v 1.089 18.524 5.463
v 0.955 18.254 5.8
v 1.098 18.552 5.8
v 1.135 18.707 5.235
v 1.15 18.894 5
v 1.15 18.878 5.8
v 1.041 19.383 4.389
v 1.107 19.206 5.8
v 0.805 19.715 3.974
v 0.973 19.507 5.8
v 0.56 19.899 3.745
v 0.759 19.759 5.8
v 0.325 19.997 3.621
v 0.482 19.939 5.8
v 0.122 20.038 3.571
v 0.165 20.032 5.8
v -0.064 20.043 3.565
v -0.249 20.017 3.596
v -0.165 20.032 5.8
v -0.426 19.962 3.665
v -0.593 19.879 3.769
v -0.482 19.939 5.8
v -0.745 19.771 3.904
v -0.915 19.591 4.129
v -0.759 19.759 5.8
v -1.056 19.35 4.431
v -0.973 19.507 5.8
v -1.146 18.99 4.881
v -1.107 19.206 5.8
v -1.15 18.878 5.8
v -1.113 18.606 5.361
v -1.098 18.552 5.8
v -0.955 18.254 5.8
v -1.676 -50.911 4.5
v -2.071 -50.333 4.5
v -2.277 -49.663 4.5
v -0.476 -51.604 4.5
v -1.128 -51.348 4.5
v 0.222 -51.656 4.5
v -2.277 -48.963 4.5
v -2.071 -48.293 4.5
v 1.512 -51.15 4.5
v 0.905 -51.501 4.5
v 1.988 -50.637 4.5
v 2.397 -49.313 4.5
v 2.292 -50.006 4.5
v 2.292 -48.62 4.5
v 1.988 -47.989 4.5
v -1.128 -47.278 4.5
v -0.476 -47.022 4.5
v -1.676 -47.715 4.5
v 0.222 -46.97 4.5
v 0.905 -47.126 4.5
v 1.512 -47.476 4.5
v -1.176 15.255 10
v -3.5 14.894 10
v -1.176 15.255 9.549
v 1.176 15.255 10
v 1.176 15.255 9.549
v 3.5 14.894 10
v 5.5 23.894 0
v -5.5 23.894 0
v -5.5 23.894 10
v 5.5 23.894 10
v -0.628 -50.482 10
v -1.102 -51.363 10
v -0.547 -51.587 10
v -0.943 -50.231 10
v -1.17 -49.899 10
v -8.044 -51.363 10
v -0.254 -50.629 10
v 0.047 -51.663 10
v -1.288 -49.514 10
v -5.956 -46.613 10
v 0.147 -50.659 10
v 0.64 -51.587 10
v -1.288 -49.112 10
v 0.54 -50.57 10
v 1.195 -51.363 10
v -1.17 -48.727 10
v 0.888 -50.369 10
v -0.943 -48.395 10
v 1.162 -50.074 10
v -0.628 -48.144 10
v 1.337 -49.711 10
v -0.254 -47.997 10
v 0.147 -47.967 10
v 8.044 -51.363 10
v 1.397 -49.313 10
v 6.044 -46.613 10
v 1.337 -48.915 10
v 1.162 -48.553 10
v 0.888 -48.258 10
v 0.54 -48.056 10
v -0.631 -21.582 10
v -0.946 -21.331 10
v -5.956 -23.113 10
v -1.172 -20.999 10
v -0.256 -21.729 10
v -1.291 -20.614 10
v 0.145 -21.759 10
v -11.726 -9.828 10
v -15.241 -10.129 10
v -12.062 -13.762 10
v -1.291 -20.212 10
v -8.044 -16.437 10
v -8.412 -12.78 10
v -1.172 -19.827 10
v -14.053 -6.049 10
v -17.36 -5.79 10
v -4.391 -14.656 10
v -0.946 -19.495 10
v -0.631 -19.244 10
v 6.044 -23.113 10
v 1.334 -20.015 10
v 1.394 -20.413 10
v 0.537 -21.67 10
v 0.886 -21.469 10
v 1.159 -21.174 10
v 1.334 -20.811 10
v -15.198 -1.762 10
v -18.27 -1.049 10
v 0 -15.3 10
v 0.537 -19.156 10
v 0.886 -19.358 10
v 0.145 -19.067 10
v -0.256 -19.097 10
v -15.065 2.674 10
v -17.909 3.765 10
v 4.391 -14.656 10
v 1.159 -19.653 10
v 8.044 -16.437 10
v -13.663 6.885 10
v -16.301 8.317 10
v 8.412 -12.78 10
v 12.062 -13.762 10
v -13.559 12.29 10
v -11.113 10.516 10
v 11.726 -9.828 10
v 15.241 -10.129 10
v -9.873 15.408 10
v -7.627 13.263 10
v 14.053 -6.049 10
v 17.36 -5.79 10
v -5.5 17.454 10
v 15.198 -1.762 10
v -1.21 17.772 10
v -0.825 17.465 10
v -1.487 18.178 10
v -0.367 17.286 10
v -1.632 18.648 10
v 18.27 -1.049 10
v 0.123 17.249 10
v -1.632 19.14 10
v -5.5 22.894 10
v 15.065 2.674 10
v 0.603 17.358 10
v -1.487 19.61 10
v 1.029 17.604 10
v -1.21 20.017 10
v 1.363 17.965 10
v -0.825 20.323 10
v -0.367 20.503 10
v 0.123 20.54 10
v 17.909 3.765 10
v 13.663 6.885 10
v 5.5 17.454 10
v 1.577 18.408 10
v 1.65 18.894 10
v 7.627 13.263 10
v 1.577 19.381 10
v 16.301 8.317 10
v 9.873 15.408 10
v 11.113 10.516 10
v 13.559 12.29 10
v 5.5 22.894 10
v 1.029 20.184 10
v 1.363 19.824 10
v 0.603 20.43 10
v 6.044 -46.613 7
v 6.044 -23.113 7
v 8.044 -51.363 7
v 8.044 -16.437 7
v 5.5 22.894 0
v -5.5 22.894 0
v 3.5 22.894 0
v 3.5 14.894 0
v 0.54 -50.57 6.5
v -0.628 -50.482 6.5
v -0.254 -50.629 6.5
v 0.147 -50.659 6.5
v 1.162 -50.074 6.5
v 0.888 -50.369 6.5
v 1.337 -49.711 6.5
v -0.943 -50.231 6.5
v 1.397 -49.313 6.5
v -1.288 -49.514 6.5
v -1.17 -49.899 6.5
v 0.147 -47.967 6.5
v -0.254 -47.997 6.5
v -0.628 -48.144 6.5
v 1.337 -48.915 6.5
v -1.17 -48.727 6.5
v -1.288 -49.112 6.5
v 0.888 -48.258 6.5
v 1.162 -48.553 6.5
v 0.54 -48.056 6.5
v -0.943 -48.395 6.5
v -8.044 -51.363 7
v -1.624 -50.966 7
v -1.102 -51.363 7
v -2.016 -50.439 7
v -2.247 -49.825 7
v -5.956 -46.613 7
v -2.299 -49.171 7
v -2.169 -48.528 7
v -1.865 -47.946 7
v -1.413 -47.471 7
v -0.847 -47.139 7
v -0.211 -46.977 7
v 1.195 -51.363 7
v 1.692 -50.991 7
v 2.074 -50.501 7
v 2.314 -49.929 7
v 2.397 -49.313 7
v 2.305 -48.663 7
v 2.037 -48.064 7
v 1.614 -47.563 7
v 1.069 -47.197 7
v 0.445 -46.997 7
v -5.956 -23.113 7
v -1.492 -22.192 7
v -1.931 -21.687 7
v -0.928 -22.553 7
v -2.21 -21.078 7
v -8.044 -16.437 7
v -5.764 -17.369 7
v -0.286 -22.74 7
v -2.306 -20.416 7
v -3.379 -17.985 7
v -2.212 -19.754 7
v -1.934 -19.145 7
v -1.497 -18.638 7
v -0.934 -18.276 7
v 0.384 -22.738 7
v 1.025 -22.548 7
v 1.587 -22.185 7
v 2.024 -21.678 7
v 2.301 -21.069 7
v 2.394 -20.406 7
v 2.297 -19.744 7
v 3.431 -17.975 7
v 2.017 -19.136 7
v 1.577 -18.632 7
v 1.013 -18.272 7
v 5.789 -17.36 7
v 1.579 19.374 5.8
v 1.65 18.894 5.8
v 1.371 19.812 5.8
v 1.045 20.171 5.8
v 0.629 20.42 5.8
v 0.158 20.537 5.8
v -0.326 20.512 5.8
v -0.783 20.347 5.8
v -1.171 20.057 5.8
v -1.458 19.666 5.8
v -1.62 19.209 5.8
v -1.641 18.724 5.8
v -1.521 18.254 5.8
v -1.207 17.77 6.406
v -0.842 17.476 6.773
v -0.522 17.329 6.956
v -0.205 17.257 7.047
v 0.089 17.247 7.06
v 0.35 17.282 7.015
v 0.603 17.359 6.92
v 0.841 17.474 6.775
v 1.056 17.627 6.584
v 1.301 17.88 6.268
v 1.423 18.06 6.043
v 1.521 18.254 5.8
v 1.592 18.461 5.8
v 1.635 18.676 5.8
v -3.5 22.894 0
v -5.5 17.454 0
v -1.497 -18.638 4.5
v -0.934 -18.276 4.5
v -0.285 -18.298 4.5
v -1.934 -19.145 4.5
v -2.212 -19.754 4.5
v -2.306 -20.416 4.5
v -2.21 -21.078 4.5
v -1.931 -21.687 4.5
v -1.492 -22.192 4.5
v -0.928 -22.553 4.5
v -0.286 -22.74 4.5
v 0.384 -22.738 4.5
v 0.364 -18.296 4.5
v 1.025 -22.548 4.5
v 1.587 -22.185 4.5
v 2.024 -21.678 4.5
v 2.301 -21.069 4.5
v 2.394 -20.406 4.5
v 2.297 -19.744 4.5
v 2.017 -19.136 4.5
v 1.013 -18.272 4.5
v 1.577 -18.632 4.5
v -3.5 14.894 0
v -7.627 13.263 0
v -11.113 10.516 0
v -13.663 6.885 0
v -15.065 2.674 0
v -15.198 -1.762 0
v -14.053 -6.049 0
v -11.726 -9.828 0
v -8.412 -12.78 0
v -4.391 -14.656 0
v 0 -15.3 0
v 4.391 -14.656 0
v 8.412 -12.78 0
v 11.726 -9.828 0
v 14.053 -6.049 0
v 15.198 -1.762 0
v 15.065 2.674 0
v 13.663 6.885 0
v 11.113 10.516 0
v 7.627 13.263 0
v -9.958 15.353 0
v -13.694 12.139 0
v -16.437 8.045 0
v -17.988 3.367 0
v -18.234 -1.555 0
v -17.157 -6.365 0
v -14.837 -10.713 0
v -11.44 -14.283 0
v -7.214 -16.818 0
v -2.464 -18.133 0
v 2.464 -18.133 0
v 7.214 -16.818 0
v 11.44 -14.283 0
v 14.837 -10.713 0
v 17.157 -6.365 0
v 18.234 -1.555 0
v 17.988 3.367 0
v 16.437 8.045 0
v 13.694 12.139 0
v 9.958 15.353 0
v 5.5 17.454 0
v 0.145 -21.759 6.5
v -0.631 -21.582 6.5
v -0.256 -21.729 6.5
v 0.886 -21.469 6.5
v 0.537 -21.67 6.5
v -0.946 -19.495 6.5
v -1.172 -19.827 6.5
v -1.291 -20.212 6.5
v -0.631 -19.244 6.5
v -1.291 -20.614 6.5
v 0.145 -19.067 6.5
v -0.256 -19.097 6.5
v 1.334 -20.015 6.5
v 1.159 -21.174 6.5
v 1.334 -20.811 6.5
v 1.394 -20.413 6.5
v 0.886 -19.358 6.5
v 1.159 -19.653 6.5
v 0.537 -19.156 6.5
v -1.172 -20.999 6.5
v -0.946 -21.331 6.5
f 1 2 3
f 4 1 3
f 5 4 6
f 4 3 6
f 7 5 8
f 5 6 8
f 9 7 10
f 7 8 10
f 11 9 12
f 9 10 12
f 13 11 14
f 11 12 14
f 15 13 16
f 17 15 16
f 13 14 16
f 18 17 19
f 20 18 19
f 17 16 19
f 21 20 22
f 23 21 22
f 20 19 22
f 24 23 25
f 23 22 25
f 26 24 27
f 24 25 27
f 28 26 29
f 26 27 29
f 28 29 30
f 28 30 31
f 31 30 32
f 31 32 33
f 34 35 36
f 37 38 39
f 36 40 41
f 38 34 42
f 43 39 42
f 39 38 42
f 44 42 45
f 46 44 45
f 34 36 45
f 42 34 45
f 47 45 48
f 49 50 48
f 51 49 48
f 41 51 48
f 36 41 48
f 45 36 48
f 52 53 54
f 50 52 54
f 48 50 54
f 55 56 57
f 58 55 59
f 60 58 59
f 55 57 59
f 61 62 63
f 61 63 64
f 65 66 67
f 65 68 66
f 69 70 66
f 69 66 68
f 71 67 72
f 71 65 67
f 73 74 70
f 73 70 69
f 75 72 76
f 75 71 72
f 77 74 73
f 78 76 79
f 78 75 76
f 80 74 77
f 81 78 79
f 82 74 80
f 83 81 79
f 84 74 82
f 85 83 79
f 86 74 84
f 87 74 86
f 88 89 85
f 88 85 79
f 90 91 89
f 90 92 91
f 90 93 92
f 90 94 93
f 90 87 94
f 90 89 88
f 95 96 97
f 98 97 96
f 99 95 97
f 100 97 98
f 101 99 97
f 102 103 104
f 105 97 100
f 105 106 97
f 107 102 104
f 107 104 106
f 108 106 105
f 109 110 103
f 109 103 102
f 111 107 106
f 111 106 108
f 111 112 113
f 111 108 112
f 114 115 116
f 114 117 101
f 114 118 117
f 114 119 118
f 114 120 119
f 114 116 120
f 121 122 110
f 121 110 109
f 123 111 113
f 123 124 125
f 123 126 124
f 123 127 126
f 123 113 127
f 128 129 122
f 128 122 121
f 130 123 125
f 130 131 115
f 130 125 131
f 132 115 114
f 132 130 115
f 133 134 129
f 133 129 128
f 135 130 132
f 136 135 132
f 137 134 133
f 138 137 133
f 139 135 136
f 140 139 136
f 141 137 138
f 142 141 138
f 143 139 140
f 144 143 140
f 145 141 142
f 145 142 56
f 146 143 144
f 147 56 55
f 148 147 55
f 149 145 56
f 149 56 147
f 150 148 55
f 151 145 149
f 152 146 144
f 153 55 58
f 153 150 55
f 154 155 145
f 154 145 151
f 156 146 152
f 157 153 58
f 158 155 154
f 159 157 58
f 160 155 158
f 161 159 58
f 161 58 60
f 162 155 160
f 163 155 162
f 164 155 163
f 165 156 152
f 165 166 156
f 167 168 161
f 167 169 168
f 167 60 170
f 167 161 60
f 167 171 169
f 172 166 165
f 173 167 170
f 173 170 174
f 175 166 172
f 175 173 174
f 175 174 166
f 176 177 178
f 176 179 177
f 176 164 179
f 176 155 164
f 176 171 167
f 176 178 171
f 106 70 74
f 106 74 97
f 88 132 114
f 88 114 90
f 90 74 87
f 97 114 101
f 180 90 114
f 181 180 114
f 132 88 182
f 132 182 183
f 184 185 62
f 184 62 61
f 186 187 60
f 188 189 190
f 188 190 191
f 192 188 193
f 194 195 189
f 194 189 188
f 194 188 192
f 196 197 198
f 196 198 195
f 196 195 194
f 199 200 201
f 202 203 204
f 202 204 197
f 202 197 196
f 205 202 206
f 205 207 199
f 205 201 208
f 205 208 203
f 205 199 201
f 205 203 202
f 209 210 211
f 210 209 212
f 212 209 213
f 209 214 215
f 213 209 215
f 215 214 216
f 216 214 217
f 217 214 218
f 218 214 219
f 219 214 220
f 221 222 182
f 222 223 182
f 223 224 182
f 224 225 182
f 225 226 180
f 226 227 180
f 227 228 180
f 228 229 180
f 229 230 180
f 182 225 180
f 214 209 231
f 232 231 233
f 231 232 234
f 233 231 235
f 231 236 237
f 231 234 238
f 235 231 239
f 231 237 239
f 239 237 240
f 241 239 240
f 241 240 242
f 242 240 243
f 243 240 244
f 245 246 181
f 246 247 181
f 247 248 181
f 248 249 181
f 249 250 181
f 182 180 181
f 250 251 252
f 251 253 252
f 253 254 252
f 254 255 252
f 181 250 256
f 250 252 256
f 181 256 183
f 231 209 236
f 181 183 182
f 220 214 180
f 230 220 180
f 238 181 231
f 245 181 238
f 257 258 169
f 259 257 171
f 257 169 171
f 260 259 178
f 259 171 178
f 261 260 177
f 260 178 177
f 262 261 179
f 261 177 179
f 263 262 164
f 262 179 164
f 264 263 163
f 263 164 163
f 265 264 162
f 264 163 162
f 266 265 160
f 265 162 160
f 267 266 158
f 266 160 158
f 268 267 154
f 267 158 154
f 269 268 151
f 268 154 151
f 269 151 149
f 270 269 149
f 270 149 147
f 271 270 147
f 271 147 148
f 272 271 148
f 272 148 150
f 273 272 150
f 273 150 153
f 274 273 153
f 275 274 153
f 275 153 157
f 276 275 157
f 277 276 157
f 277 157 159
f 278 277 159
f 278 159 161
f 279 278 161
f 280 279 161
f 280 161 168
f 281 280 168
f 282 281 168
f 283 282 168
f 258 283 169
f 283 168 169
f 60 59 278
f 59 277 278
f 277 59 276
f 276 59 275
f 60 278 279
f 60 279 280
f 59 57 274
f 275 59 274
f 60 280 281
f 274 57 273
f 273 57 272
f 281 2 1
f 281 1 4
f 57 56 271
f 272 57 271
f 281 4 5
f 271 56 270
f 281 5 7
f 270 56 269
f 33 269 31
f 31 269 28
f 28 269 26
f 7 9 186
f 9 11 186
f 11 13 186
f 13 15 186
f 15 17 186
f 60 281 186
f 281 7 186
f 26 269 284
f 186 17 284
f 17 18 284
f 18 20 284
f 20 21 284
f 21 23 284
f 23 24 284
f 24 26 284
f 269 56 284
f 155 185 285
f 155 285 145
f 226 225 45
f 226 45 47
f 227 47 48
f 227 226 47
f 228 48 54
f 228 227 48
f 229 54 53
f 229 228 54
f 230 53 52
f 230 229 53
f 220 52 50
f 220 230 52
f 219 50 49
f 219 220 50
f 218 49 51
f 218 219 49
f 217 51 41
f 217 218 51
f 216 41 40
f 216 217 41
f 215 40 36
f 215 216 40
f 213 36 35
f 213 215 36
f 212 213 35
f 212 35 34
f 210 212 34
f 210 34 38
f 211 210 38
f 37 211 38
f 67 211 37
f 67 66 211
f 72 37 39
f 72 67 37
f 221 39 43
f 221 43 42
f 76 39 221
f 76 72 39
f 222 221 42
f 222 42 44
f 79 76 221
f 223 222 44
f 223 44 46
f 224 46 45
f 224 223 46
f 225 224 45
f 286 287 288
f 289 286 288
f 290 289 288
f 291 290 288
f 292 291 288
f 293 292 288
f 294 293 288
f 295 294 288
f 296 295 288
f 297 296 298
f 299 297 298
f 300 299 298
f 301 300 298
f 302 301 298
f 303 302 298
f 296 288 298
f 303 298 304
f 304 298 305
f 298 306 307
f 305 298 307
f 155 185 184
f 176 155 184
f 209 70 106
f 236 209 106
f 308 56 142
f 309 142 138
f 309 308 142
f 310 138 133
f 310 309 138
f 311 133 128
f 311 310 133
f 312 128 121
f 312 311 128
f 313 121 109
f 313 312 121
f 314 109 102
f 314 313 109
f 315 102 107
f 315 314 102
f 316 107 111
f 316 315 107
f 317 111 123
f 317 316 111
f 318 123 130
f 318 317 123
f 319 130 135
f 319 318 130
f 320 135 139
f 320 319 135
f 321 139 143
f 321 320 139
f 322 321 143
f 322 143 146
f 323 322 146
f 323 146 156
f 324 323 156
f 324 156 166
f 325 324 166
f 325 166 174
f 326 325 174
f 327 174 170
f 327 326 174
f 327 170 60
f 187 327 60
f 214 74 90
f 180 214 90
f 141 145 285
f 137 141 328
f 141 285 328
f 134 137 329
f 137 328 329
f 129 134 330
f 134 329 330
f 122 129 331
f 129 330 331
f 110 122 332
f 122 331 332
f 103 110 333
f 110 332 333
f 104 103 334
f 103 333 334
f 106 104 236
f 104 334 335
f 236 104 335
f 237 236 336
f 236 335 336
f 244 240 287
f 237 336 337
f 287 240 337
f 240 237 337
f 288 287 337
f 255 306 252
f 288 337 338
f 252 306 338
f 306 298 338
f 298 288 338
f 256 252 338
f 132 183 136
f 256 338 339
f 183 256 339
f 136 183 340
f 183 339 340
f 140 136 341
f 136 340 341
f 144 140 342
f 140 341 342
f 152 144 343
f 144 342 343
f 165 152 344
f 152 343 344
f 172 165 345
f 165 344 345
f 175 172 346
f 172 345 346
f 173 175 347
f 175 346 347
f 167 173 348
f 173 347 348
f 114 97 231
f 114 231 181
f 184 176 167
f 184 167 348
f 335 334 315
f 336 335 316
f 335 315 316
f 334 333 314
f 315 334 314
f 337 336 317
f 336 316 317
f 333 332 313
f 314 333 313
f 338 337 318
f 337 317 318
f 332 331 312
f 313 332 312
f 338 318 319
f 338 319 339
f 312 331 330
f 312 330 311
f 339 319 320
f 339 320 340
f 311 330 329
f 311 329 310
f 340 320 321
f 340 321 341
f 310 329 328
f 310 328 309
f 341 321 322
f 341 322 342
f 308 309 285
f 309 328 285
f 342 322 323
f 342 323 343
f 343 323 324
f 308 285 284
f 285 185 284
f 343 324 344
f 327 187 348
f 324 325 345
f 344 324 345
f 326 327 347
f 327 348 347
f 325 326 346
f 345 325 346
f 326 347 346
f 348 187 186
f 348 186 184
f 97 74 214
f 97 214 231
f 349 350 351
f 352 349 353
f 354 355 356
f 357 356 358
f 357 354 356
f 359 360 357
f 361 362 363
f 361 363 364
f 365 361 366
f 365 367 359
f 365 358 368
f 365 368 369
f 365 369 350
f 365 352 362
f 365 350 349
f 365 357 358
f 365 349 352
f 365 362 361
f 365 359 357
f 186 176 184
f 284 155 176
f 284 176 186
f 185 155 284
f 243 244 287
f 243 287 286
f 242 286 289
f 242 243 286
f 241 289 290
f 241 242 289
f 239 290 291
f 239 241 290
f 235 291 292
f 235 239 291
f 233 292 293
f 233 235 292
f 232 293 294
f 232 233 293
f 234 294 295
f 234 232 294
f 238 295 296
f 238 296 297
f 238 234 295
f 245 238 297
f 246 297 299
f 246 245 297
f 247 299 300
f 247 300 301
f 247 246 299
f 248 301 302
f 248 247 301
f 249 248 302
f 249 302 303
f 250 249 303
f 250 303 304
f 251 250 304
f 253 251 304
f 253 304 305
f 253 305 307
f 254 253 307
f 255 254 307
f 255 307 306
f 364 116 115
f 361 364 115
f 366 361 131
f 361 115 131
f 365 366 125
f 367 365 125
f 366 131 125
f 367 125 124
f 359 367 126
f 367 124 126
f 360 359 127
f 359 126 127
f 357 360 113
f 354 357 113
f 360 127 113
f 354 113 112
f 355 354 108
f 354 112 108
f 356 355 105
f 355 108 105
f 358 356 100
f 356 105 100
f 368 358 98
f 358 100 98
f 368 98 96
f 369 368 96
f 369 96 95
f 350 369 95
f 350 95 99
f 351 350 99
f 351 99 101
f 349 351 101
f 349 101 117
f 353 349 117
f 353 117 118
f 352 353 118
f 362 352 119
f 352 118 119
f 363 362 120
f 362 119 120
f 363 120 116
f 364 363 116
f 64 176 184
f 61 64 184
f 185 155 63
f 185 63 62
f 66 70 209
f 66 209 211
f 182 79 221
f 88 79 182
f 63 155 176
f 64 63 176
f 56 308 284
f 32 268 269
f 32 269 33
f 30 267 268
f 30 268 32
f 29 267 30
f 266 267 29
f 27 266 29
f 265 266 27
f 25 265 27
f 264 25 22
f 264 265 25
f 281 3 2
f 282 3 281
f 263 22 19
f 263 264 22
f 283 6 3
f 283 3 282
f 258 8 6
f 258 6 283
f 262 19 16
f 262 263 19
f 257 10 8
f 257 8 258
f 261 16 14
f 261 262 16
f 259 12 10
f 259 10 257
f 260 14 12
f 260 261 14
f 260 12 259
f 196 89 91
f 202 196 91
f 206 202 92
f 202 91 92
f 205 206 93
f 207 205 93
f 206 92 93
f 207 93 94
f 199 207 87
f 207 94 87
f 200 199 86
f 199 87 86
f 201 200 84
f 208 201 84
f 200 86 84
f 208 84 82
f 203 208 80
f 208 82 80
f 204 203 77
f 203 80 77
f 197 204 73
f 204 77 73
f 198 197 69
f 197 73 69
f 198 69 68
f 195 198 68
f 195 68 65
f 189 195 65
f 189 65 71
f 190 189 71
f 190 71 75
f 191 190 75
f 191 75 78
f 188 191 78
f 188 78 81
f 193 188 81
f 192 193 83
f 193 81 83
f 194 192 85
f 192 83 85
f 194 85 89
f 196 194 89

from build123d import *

# Parameters (mm, degrees)
SKETCH2_R       = 18.3
SKETCH2_R_2     = 15.3
EXTRUDE1_DEPTH  = 10
SKETCH3_W       = 16.087912088
SKETCH3_H       = 34.925770001
SKETCH3_W_2     = 12
SKETCH3_H_2     = 23.5
EXTRUDE2_DEPTH  = 3
SKETCH4_W       = 7
SKETCH4_H       = 3.40570579
EXTRUDE3_DEPTH  = 11
SKETCH5_W       = 7
SKETCH5_H       = 8
EXTRUDE4_DEPTH  = 10
EXTRUDE5_DEPTH  = 7
SKETCH7_W       = 10
SKETCH7_H       = 8
EXTRUDE6_DEPTH  = 2
SKETCH8_W       = 10
SKETCH8_H       = 8
EXTRUDE7_DEPTH  = 2
SKETCH9_W       = 11
SKETCH9_H       = 10
EXTRUDE9_DEPTH  = 1
SKETCH10_R      = 1.65
EXTRUDE10_DEPTH = 4.2
SKETCH11_R      = 1.15
EXTRUDE12_DEPTH = 6.8
SKETCH12_R      = 15.3
EXTRUDE13_DEPTH = 11
SKETCH29_R      = 2.35
EXTRUDE30_DEPTH = 5.5
SKETCH31_R      = 1.35
EXTRUDE31_DEPTH = 3.5


with BuildPart() as part:
    # Sketch2 → Extrude1 (new body)
    with BuildSketch(Plane.XY):
        Circle(SKETCH2_R)
        Circle(SKETCH2_R_2, mode=Mode.SUBTRACT)
    extrude(amount=EXTRUDE1_DEPTH)

    # Sketch3 → Extrude2 (add)
    with BuildSketch(Plane.XY.offset(10)):
        with Locations((0, -33.900183172)):
            Rectangle(SKETCH3_W, SKETCH3_H)
        with Locations((0.043956044, -34.863068172)):
            Rectangle(SKETCH3_W_2, SKETCH3_H_2, mode=Mode.SUBTRACT)
    extrude(amount=-EXTRUDE2_DEPTH)

    # Sketch4 → Extrude3 (cut, through all)
    with BuildSketch(Plane(origin=(0, 0, 0), x_dir=(-1, 0, 0), z_dir=(0, 0, -1))):
        with Locations((0, 16.597147105)):
            Rectangle(SKETCH4_W, SKETCH4_H)
    extrude(amount=-EXTRUDE3_DEPTH, mode=Mode.SUBTRACT)



with BuildPart() as body_2:
    # Sketch5 → Extrude4 (new body)
    with BuildSketch(Plane(origin=(0, 0, 0), x_dir=(-1, 0, 0), z_dir=(0, 0, -1))):
        with Locations((0, 18.89429421)):
            Rectangle(SKETCH5_W, SKETCH5_H)
    extrude(amount=-EXTRUDE4_DEPTH)

    # Sketch6 → Extrude5 (cut)
    with BuildSketch(Plane.ZY.offset(3.5)):
        Polygon((10, 14.89429421), (0, 22.89429421), (0, 14.89429421), align=None)
    extrude(amount=-EXTRUDE5_DEPTH, mode=Mode.SUBTRACT)


with BuildPart() as part_1:
    add(part.part)

    add(body_2.part)  # Extrude6 merges body 2
    # Sketch7 → Extrude6 (add)
    with BuildSketch(Plane.ZY.offset(3.5)):
        with Locations((5, 18.89429421)):
            Rectangle(SKETCH7_W, SKETCH7_H)
    extrude(amount=EXTRUDE6_DEPTH)

    # Sketch8 → Extrude7 (add)
    with BuildSketch(Plane(origin=(3.5, 0, 0), x_dir=(0, 0, -1), z_dir=(1, 0, 0))):
        with Locations((-5, 18.89429421)):
            Rectangle(SKETCH8_W, SKETCH8_H)
    extrude(amount=EXTRUDE7_DEPTH)

    # Sketch10 → Extrude10 (cut)
    with BuildSketch(Plane.XY.offset(10)):
        with Locations((0, 18.89429421)):
            Circle(SKETCH10_R)
    extrude(amount=-EXTRUDE10_DEPTH, mode=Mode.SUBTRACT)

    # Sketch11 → Extrude12 (cut, through all)
    with BuildSketch(Plane.XY.offset(5.8)):
        with Locations((0, 18.89429421)):
            Circle(SKETCH11_R)
    extrude(amount=-EXTRUDE12_DEPTH, mode=Mode.SUBTRACT)

    # Sketch12 → Extrude13 (cut, through all)
    with BuildSketch(Plane(origin=(0, 0, 0), x_dir=(-1, 0, 0), z_dir=(0, 0, -1))):
        Circle(SKETCH12_R)
    extrude(amount=-EXTRUDE13_DEPTH, mode=Mode.SUBTRACT)

    # Sketch29 → Extrude30 (add)
    with BuildSketch(Plane.XY.offset(10)):
        with Locations((0.043956044, -20.413068172)):
            Circle(SKETCH29_R)
        with Locations((0.046502138, -49.313066971)):
            Circle(SKETCH29_R)
    extrude(amount=-EXTRUDE30_DEPTH)

    # Sketch31 → Extrude31 (cut)
    with BuildSketch(Plane.XY.offset(10)):
        with Locations((0.046502138, -49.313066971)):
            Circle(SKETCH31_R)
        with Locations((0.043956044, -20.413068172)):
            Circle(SKETCH31_R)
    extrude(amount=-EXTRUDE31_DEPTH, mode=Mode.SUBTRACT)


with BuildPart() as body_2_2:
    # Sketch9 → Extrude9 (new body)
    with BuildSketch(Plane(origin=(0, 22.89429421, 0), x_dir=(1, 0, 0), z_dir=(0, 1, 0))):
        with Locations((0, -5)):
            Rectangle(SKETCH9_W, SKETCH9_H)
    extrude(amount=EXTRUDE9_DEPTH)


solid = Compound([part_1.part, body_2_2.part])
